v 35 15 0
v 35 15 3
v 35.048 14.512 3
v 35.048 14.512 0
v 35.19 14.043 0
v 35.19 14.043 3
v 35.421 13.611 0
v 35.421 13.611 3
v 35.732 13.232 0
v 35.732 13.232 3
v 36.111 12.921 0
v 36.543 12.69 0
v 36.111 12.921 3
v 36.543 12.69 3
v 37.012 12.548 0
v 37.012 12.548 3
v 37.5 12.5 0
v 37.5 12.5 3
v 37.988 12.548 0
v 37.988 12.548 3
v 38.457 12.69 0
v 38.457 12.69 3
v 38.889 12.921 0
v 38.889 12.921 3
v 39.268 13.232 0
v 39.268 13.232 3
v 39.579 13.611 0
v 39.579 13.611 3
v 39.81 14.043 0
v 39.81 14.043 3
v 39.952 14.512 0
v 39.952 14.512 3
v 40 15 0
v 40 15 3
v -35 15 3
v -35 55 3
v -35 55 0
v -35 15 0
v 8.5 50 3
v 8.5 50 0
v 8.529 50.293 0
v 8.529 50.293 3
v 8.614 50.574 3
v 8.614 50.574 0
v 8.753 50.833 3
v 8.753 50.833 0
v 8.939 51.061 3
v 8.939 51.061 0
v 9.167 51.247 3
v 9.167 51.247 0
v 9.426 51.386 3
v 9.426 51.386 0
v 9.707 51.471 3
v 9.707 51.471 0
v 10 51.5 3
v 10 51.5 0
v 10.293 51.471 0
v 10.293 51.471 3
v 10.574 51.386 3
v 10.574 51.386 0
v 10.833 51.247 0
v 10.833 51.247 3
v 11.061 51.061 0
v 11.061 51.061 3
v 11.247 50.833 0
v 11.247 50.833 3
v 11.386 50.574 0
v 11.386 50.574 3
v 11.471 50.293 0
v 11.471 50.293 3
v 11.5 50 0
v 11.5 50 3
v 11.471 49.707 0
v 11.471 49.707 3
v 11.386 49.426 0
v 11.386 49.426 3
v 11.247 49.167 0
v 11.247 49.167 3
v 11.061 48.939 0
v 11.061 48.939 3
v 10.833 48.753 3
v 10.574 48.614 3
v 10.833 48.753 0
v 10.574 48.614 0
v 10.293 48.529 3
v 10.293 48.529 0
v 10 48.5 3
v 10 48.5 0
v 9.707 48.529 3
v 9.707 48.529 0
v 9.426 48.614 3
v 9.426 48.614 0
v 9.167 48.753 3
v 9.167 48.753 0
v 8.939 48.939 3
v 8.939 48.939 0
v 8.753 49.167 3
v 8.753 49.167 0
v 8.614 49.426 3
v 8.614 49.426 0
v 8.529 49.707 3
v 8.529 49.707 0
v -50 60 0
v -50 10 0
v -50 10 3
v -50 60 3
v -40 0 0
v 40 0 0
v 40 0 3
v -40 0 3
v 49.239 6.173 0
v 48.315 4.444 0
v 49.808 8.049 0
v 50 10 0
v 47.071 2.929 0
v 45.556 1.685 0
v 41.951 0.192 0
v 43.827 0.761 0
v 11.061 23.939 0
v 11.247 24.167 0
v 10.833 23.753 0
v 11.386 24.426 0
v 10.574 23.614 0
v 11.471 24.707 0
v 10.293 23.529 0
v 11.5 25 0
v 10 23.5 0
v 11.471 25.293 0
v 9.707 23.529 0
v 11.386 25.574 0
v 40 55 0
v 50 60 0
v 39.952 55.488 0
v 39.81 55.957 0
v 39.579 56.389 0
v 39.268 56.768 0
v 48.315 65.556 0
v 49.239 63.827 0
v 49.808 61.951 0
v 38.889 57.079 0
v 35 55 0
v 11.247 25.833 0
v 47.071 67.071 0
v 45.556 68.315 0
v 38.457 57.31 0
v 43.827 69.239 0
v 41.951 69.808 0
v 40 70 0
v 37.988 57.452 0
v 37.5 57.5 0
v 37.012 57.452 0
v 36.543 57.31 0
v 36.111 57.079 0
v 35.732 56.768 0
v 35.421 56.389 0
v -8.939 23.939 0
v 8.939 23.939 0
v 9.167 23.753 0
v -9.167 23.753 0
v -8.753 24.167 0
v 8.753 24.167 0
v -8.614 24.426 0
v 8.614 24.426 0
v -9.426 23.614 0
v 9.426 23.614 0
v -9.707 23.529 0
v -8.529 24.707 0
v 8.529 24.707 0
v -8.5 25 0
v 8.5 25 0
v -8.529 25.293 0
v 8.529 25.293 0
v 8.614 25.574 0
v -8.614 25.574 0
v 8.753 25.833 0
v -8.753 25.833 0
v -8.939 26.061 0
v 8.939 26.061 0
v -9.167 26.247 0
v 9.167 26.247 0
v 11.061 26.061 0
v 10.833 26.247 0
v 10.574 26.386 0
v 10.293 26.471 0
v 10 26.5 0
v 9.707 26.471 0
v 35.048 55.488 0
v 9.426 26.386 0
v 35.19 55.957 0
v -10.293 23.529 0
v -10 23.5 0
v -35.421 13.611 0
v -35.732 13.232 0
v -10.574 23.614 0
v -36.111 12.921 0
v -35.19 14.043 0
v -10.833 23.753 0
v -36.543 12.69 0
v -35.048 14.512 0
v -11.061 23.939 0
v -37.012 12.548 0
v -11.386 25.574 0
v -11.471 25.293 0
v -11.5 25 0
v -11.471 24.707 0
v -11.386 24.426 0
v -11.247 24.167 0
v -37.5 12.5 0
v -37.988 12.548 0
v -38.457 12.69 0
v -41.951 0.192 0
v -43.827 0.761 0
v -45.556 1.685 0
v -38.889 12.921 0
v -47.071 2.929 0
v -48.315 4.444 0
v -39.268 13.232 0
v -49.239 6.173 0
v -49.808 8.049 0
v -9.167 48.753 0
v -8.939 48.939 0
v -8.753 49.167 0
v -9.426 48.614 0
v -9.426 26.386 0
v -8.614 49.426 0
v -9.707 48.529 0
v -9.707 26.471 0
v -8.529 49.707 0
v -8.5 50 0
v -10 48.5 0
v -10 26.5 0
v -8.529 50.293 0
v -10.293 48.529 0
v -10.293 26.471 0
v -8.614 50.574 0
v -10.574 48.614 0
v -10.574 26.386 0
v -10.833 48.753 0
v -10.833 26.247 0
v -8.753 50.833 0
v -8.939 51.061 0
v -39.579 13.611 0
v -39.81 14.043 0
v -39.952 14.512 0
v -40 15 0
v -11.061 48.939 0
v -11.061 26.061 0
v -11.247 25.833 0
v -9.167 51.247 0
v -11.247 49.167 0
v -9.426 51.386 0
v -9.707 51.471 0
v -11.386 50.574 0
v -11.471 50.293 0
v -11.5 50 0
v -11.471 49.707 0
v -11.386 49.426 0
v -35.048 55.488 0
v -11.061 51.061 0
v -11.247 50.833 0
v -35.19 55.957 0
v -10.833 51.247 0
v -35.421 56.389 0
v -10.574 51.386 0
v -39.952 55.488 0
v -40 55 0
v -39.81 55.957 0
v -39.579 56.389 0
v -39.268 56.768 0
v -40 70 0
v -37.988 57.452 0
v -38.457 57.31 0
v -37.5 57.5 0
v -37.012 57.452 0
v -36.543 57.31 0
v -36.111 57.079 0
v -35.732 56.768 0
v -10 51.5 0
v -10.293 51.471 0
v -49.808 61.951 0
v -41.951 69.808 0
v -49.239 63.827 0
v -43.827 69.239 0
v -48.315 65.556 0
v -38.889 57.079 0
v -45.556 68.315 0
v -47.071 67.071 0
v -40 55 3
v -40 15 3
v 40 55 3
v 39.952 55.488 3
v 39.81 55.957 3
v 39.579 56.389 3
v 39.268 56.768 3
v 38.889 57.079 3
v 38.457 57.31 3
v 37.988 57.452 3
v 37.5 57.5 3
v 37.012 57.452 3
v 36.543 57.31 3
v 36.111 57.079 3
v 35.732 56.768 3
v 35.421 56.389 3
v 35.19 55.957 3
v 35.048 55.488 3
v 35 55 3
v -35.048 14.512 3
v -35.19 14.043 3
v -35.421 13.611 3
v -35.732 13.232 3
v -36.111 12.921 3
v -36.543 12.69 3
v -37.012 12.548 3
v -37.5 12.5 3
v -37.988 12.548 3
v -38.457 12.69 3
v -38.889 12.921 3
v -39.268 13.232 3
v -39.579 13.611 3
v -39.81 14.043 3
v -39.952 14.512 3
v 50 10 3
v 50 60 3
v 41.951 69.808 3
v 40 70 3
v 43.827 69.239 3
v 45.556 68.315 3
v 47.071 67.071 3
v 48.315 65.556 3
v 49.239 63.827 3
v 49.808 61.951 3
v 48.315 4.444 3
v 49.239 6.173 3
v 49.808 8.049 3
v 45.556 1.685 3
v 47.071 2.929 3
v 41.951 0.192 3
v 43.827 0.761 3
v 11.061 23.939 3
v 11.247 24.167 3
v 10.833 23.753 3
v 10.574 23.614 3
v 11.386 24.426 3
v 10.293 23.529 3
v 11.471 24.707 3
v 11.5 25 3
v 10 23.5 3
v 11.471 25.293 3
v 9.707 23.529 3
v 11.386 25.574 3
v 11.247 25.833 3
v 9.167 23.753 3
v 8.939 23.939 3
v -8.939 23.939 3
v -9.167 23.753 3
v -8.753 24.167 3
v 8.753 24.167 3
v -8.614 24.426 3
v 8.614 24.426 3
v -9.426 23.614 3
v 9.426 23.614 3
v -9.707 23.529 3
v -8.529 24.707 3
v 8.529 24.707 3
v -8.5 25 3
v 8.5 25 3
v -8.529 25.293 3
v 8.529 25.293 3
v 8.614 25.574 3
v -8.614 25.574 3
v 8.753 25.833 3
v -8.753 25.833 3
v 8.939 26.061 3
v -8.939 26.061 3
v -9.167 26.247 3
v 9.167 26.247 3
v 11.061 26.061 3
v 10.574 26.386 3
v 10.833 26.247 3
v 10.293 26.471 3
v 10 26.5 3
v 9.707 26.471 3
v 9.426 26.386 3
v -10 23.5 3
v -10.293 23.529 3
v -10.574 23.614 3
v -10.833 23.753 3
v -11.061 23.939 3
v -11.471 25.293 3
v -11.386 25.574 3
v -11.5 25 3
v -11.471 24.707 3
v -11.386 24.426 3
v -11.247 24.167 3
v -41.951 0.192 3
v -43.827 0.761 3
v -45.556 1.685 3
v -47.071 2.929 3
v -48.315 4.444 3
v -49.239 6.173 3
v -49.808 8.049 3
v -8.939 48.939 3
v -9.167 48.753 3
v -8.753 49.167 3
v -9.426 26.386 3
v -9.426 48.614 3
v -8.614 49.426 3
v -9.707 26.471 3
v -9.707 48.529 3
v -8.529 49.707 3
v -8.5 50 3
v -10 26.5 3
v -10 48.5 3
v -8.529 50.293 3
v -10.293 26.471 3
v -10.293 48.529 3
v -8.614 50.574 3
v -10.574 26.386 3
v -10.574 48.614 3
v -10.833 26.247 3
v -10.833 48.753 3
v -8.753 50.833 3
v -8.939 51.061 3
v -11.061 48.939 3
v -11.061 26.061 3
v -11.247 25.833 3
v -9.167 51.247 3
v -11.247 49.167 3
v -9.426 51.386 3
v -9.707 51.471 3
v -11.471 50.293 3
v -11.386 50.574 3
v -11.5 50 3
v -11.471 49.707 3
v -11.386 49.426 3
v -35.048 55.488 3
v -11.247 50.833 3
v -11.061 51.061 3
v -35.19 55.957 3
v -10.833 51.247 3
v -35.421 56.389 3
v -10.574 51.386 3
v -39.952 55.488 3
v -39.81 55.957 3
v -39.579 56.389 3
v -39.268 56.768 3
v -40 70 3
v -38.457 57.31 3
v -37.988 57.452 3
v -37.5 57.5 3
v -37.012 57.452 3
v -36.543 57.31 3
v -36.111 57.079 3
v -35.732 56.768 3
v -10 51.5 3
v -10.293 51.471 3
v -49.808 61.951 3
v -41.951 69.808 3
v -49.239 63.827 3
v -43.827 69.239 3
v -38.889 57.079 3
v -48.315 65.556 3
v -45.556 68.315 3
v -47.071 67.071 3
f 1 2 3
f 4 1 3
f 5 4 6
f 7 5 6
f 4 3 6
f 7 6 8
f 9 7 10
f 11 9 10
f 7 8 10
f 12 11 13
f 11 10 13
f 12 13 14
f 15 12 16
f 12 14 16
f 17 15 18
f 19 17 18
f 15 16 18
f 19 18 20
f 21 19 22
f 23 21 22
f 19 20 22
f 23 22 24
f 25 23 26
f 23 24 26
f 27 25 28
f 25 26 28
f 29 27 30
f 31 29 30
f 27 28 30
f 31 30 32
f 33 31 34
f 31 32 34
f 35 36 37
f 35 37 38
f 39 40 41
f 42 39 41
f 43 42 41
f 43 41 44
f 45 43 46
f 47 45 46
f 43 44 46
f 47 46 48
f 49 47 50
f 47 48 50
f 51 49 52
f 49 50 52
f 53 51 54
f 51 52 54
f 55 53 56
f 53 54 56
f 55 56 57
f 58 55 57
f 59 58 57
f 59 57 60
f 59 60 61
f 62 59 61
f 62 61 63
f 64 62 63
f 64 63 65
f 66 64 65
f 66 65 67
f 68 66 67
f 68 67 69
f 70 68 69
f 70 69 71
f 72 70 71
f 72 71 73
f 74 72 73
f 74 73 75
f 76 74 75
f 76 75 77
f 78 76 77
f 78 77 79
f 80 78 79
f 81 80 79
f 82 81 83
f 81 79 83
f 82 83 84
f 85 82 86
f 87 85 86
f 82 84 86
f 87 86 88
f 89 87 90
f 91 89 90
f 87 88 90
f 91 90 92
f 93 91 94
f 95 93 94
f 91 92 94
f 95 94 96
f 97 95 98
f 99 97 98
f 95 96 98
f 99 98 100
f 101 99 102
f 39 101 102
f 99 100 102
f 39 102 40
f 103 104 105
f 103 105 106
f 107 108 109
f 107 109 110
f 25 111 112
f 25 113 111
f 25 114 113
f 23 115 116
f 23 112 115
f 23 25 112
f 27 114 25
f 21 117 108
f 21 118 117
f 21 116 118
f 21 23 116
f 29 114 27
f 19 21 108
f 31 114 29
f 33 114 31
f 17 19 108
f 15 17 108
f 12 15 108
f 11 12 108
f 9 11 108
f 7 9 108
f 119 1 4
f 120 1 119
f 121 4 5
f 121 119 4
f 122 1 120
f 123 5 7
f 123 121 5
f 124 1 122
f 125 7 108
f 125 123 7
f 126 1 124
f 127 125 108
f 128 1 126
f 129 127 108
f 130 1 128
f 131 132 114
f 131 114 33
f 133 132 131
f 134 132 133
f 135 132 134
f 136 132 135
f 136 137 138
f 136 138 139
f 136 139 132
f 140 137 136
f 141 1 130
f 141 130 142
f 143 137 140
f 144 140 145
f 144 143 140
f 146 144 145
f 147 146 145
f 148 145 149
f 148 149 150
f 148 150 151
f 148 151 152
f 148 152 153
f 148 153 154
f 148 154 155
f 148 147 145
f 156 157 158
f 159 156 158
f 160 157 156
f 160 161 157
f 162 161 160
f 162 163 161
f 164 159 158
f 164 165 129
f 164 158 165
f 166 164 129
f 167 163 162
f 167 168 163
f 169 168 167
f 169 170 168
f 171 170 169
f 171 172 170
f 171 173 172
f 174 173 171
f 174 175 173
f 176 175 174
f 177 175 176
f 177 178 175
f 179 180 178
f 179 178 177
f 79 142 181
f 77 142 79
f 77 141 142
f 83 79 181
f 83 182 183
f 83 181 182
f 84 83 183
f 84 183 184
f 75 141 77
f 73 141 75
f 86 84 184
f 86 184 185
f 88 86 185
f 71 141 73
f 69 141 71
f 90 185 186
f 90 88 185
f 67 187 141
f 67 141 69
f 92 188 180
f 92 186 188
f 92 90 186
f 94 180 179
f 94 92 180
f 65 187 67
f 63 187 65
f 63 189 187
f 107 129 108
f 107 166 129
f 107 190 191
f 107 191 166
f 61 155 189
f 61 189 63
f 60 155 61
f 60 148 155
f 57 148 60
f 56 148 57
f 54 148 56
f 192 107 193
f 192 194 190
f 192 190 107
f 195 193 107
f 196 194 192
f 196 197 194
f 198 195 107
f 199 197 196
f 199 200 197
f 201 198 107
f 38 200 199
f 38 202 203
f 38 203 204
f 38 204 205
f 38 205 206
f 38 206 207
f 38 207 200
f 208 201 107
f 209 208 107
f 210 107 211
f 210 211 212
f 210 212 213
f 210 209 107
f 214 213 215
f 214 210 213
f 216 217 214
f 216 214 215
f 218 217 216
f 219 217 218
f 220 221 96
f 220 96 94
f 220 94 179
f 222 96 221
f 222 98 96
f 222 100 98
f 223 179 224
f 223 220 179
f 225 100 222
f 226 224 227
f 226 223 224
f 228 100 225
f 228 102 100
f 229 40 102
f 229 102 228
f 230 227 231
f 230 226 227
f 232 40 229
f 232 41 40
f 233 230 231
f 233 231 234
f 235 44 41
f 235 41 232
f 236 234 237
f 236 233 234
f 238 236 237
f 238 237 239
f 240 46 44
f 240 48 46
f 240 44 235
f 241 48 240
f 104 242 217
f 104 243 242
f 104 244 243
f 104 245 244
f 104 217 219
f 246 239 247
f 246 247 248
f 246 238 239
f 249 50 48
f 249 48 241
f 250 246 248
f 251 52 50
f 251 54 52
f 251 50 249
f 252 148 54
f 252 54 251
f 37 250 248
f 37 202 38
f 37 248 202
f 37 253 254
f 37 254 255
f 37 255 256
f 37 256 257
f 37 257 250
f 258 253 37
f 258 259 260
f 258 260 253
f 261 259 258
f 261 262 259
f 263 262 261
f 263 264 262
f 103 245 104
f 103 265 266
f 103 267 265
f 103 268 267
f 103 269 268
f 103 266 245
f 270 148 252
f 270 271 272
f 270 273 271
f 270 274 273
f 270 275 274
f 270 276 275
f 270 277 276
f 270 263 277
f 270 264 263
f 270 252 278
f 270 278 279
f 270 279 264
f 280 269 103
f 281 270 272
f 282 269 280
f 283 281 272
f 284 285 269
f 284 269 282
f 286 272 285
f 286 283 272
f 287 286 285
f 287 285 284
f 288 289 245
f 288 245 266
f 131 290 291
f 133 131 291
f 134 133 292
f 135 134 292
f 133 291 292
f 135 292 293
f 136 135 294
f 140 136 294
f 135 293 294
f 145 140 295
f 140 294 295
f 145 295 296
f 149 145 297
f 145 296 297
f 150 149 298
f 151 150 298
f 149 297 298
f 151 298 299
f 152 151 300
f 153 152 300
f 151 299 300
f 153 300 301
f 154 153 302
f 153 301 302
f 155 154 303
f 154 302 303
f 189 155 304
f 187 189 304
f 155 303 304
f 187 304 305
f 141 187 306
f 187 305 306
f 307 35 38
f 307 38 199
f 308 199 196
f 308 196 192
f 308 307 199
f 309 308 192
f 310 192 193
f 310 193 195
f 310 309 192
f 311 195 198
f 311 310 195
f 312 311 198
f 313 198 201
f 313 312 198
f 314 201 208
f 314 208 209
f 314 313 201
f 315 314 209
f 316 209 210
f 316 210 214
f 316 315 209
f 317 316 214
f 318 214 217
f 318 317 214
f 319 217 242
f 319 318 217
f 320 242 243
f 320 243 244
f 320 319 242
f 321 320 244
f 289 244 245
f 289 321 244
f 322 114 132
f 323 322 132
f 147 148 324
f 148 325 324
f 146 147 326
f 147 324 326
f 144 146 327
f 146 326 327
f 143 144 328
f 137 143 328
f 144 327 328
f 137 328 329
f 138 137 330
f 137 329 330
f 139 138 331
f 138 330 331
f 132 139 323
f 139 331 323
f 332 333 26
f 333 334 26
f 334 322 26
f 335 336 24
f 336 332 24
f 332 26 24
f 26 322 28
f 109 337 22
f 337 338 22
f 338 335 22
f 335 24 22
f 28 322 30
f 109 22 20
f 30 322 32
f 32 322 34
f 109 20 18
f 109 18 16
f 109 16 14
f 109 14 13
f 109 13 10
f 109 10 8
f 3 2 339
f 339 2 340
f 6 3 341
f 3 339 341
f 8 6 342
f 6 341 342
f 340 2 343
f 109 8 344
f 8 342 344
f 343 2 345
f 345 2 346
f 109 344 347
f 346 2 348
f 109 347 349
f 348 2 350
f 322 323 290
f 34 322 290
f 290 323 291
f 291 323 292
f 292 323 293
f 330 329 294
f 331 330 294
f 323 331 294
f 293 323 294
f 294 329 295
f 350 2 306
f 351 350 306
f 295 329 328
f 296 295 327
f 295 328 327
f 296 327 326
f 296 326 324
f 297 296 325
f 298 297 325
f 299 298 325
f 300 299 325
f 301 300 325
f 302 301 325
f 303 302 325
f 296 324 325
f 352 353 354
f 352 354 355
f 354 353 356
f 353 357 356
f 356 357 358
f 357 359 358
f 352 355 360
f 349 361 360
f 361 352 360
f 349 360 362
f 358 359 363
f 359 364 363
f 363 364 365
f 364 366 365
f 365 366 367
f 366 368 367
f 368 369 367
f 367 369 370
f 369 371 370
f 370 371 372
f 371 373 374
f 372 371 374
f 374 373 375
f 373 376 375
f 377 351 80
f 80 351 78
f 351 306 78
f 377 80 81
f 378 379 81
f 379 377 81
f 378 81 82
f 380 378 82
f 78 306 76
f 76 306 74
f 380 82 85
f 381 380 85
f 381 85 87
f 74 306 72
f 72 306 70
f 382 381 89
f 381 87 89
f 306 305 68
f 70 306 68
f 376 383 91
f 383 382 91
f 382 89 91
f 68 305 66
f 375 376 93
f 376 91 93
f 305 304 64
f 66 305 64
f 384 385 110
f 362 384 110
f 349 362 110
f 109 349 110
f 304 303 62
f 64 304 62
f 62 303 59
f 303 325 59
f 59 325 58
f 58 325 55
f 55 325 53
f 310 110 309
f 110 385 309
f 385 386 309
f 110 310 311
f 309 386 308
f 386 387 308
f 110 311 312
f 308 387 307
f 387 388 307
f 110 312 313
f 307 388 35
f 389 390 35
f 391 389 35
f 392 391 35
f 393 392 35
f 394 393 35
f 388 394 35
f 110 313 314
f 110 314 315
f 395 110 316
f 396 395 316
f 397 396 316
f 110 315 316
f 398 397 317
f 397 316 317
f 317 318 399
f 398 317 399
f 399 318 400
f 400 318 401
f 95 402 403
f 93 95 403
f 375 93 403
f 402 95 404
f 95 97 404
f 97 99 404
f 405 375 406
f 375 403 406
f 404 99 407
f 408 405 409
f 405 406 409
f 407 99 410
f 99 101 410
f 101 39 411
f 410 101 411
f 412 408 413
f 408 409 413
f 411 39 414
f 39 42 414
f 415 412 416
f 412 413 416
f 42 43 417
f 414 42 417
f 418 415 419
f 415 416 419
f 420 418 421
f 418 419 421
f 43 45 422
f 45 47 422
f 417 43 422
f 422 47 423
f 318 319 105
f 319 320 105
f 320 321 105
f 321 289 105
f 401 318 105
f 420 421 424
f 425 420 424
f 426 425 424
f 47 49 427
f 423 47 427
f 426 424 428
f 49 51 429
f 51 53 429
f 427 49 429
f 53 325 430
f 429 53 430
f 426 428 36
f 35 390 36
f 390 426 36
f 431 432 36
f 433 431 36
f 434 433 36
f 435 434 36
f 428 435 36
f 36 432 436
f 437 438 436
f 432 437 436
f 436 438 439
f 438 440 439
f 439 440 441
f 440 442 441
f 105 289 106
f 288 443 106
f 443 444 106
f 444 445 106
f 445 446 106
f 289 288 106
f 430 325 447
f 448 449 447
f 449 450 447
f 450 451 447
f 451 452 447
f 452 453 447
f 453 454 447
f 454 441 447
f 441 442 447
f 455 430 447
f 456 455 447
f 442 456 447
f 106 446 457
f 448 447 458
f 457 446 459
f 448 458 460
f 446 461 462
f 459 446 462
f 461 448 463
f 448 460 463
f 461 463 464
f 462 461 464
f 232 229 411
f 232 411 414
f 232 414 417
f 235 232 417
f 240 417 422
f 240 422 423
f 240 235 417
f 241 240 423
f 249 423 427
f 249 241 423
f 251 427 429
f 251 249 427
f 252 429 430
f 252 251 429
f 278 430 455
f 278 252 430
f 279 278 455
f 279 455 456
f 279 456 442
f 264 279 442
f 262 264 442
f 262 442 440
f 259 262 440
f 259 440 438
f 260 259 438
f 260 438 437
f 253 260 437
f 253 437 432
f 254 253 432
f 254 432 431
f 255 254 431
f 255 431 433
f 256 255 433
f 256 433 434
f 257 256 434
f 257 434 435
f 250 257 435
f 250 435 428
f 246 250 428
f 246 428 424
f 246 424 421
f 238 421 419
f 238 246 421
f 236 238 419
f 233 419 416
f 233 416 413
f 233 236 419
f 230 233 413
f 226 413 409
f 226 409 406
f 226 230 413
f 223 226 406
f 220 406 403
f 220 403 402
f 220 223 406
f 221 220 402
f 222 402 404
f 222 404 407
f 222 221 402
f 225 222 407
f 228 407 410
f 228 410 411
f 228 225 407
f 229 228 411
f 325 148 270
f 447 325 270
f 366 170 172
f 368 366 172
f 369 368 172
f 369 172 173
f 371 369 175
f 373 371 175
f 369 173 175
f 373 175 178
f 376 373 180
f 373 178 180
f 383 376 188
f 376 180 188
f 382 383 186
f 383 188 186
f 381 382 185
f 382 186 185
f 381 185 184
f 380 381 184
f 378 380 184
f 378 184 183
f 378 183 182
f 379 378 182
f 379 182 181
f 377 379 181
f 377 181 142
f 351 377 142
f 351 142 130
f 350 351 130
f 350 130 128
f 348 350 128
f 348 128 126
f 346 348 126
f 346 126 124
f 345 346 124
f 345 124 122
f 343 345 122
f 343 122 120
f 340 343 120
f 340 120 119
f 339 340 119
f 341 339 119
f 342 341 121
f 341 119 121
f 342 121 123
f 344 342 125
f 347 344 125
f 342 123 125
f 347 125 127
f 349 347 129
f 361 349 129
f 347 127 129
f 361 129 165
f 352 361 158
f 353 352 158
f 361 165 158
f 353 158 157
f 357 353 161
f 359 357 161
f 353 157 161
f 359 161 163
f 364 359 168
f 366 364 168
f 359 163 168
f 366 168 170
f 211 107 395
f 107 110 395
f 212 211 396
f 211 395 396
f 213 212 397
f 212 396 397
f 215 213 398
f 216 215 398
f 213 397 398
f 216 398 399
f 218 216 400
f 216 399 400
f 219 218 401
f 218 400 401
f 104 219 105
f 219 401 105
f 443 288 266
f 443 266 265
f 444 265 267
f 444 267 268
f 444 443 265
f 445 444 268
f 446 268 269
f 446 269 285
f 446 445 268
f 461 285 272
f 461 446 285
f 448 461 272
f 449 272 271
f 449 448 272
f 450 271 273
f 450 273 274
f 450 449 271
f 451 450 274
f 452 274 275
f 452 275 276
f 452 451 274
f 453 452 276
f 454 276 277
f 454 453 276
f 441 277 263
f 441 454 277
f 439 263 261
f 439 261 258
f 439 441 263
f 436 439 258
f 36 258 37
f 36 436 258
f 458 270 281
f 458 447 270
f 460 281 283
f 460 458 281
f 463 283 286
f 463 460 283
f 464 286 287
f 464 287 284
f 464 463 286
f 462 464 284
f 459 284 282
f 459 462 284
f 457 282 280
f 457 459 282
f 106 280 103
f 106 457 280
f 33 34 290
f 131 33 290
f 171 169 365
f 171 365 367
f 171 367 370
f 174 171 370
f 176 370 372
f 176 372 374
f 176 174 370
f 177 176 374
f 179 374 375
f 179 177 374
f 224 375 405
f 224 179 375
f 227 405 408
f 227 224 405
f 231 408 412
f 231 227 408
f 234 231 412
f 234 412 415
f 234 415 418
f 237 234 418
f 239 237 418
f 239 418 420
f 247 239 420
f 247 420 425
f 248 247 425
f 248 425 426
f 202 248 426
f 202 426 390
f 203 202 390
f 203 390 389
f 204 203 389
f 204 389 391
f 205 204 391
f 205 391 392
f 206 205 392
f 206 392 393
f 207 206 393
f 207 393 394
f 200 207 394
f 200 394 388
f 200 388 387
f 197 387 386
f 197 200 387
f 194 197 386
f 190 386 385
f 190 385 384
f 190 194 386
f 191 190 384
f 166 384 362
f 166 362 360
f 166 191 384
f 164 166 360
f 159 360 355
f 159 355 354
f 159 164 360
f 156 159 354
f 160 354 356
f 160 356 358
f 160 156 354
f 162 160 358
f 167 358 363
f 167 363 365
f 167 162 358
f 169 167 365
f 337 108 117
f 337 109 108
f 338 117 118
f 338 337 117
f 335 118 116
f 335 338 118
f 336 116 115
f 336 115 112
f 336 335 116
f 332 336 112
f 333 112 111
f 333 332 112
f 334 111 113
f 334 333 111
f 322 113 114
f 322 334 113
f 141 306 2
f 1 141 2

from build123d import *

# Parameters (mm, degrees)
F0_W     = 50
F0_H     = 70
F1_DEPTH = 3
F4_D     = 3
F8_DEPTH = 28.640468
F9_R     = 10


with BuildPart() as f1:
    # F0 (on Top) → F1 (new body)
    with BuildSketch(Plane.XY):
        with Locations((25, 35)):
            Rectangle(F0_W, F0_H)
    extrude(amount=F1_DEPTH)

    # F4 (through all)
    with Locations(Plane.XY.offset(3)):
        with Locations((10, 25), (10, 50)):
            Hole(F4_D / 2)

    # F7 (on face) → F8 (cut)
    with BuildSketch(Plane.XY.offset(3)):
        with BuildLine():
            ThreePointArc((35, 15), (37.5, 12.5), (40, 15))
            Line((40, 15), (40, 55))
            ThreePointArc((40, 55), (37.5, 57.5), (35, 55))
            Line((35, 55), (35, 15))
        make_face()
    extrude(amount=-F8_DEPTH, mode=Mode.SUBTRACT)

    # F9
    f9_edges = [f1.edges().sort_by_distance(p)[0] for p in [
        (50, 70, 1.5),
        (50, 0, 1.5),
    ]]
    fillet(f9_edges, radius=F9_R)

    # F10: F1 across plane


with BuildPart() as f1_1:
    add(f1.part)
    add(f1.part.mirror(Plane.YZ))


solid = f1_1.part
